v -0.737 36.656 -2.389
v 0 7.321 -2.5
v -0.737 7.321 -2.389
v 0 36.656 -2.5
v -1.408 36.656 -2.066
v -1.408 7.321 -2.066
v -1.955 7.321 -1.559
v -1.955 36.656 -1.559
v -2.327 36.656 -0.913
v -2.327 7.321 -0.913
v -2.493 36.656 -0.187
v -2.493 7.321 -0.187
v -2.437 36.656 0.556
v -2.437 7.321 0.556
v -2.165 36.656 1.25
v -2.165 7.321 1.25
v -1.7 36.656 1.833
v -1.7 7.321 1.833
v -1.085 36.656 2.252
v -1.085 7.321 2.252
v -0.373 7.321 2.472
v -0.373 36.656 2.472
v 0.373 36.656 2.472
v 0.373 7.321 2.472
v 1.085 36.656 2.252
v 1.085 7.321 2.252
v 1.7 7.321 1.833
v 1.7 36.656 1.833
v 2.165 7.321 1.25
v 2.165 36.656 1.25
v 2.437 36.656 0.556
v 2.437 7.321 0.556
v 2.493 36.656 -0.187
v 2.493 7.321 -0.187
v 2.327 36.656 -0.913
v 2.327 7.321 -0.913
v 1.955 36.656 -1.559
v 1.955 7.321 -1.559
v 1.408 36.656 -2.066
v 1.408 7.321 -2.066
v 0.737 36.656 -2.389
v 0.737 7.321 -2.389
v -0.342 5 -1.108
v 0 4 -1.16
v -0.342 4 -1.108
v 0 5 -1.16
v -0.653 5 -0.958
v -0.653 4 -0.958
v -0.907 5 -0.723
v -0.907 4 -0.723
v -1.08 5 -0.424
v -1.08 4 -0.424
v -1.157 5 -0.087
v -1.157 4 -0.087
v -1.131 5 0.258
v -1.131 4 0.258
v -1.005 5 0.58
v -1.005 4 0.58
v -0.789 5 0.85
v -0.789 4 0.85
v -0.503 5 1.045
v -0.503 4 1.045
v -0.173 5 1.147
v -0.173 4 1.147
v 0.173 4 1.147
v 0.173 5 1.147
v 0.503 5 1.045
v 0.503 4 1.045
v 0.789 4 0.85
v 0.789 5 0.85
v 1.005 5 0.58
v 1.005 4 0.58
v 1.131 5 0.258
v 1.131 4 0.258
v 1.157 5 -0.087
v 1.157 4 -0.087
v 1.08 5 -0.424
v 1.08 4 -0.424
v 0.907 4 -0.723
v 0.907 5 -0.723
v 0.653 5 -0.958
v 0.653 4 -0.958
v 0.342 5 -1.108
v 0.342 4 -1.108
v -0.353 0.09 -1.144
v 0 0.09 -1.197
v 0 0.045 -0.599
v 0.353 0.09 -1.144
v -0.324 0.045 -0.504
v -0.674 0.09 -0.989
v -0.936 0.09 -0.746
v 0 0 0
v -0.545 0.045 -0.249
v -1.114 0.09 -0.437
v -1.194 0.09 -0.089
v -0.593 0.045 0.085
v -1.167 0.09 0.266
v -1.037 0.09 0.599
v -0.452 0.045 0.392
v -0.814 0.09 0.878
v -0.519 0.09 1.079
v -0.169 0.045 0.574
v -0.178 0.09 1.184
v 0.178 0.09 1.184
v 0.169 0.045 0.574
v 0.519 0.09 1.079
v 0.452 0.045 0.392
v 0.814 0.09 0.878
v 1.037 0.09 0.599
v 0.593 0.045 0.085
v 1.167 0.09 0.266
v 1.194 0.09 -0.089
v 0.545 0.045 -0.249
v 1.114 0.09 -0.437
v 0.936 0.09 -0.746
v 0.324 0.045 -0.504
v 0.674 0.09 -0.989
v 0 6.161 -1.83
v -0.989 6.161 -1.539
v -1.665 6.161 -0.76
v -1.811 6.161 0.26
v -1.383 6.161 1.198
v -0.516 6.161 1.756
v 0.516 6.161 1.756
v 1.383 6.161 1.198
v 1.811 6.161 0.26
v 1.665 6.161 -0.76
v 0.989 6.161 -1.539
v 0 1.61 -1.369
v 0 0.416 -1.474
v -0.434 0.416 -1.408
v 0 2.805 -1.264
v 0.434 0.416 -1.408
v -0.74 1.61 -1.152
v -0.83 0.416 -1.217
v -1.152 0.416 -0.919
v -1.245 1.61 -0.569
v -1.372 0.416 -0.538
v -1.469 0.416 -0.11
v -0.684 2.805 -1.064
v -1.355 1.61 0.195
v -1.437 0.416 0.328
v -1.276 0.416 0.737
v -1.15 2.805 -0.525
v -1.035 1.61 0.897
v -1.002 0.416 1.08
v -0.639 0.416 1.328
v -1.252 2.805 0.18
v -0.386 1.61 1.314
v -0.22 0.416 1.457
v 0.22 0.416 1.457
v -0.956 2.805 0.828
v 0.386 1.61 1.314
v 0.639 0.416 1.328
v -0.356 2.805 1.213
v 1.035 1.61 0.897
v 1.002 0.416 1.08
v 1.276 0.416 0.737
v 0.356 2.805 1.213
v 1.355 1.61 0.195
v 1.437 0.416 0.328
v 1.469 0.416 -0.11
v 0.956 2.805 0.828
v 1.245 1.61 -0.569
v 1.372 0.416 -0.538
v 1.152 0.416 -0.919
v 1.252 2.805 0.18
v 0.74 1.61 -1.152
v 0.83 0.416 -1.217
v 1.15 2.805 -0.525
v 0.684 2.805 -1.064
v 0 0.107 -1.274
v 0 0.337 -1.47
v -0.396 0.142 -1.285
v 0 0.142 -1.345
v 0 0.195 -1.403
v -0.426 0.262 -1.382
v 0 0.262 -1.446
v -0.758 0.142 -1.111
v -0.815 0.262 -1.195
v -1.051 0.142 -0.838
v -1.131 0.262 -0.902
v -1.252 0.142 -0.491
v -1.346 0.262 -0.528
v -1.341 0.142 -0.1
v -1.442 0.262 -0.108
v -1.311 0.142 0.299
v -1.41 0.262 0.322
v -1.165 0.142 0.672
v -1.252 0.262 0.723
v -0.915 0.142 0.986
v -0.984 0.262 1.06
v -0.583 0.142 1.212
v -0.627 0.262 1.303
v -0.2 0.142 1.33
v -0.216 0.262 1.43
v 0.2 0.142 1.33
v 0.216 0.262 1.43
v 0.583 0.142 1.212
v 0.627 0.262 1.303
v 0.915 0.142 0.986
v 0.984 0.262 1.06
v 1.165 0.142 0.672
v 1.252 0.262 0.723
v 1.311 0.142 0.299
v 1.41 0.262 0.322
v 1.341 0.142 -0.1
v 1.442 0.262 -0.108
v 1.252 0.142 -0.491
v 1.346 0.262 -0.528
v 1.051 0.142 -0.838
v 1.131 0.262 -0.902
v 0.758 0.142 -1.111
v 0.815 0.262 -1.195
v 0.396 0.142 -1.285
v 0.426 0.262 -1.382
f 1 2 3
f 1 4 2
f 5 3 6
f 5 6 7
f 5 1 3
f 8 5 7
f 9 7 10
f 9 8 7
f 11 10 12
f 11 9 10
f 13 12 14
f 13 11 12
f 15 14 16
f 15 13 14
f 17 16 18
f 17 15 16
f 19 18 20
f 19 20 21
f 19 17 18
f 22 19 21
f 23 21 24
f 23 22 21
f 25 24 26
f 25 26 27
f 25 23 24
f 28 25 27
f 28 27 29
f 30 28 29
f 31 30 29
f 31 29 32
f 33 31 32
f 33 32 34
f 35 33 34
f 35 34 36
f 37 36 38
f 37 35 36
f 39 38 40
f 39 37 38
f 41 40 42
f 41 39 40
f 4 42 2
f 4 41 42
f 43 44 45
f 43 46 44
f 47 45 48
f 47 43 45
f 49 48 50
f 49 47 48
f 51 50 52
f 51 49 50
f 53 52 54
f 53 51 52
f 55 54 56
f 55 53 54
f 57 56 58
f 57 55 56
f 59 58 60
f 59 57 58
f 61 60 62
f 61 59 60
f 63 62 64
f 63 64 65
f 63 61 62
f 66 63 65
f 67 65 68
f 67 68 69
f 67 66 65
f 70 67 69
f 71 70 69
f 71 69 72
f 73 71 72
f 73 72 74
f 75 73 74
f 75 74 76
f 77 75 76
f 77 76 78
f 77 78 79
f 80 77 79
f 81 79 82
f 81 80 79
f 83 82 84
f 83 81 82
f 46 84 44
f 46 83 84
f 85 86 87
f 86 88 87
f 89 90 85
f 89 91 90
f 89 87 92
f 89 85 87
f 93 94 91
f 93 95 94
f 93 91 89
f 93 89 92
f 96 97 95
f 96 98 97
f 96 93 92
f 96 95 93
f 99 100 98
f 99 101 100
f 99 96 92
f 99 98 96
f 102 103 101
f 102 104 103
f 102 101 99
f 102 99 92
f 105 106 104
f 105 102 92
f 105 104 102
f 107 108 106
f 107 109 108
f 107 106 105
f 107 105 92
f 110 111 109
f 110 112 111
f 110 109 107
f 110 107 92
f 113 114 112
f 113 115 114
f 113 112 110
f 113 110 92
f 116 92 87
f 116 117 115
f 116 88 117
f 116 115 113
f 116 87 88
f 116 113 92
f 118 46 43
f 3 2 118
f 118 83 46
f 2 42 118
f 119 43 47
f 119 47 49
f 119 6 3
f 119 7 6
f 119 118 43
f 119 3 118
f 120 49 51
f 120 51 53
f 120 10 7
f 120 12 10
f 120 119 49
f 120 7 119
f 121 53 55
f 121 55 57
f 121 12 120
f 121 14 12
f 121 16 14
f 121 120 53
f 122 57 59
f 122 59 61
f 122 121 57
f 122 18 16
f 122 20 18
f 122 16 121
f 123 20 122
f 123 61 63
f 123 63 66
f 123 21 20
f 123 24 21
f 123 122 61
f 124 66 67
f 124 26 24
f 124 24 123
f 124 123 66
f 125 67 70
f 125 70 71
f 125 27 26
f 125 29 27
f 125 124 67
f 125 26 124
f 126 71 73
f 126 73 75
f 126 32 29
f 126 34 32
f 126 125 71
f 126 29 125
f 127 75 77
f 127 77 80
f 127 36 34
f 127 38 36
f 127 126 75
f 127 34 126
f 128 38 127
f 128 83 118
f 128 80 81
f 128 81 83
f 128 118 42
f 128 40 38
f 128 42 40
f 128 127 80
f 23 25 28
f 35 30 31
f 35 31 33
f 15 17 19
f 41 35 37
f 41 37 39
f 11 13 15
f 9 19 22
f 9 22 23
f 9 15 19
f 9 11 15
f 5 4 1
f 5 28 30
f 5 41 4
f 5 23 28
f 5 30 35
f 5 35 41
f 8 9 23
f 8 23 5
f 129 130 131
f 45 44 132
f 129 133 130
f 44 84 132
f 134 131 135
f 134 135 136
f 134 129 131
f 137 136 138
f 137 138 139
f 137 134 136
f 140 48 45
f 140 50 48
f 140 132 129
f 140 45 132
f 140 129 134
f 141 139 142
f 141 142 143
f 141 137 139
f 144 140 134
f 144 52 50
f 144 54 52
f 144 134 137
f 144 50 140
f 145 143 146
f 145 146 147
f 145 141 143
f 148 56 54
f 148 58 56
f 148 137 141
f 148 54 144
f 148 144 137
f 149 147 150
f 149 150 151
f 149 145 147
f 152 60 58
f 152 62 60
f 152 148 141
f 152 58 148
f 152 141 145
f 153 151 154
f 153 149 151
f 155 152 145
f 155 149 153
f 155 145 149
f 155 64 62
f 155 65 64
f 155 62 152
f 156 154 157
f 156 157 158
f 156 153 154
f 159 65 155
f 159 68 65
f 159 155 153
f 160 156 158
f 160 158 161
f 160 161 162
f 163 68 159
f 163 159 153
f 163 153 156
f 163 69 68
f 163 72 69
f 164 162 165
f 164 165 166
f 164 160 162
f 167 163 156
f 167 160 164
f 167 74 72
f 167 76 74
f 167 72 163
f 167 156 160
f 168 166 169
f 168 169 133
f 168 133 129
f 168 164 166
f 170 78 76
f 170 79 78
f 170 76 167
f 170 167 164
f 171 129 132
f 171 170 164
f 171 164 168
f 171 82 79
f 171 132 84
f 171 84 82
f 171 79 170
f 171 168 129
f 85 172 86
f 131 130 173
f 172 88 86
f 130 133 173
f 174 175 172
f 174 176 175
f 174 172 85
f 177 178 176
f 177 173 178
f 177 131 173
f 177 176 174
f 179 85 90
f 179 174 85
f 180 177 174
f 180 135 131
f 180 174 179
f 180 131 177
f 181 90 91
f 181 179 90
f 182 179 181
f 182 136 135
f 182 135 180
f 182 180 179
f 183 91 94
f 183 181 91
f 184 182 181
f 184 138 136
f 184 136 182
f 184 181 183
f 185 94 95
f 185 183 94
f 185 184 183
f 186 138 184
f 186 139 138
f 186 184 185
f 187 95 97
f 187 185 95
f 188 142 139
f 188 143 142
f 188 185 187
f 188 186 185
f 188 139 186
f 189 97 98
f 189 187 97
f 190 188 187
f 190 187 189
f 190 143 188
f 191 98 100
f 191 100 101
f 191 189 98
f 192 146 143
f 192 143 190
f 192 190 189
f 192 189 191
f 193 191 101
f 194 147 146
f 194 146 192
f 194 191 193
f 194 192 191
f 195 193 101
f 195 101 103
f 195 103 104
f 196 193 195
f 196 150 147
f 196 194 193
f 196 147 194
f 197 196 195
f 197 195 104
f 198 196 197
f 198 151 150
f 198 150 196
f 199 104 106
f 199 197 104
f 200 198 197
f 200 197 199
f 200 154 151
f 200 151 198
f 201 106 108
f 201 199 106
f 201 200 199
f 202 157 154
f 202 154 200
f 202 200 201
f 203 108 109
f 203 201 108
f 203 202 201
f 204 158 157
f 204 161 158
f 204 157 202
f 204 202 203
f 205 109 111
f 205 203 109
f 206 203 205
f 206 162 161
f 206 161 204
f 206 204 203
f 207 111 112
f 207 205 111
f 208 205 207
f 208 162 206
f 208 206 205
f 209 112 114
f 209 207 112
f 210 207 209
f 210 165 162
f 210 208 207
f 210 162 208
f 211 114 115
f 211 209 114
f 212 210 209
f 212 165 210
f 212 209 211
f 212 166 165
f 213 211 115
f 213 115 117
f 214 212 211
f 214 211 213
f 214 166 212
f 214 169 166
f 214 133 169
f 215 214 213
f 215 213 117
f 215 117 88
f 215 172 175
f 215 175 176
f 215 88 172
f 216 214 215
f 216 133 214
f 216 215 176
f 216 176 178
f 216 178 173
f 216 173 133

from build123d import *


with BuildPart() as part:
    # Sketch1 → Revolve3 (revolve)
    with BuildSketch(Plane.XY, mode=Mode.PRIVATE) as revolve3_sk:
        with BuildLine():
            Line((0, 0), (1.19724359, 0.09030412))
            ThreePointArc((1.19724359, 0.09030412), (1.403333579, 0.195244703), (1.473538086, 0.415601089))
            Line((1.473538086, 0.415601089), (1.159943816, 4))
            Line((1.159943816, 4), (1.159943816, 5))
            Line((1.159943816, 5), (2.5, 7.321045395))
            Line((2.5, 7.321045395), (2.5, 36.656450649))
            Line((2.5, 36.656450649), (0, 36.656450649))
            Line((0, 36.656450649), (0, 0))
        make_face()
    revolve(revolve3_sk.sketch.rotate(Axis((0, 0, 0), (0, 1, 0)), 90), axis=Axis((0, 0, 0), (0, 1, 0)))  # turned: the seam where the file's is


solid = part.part
